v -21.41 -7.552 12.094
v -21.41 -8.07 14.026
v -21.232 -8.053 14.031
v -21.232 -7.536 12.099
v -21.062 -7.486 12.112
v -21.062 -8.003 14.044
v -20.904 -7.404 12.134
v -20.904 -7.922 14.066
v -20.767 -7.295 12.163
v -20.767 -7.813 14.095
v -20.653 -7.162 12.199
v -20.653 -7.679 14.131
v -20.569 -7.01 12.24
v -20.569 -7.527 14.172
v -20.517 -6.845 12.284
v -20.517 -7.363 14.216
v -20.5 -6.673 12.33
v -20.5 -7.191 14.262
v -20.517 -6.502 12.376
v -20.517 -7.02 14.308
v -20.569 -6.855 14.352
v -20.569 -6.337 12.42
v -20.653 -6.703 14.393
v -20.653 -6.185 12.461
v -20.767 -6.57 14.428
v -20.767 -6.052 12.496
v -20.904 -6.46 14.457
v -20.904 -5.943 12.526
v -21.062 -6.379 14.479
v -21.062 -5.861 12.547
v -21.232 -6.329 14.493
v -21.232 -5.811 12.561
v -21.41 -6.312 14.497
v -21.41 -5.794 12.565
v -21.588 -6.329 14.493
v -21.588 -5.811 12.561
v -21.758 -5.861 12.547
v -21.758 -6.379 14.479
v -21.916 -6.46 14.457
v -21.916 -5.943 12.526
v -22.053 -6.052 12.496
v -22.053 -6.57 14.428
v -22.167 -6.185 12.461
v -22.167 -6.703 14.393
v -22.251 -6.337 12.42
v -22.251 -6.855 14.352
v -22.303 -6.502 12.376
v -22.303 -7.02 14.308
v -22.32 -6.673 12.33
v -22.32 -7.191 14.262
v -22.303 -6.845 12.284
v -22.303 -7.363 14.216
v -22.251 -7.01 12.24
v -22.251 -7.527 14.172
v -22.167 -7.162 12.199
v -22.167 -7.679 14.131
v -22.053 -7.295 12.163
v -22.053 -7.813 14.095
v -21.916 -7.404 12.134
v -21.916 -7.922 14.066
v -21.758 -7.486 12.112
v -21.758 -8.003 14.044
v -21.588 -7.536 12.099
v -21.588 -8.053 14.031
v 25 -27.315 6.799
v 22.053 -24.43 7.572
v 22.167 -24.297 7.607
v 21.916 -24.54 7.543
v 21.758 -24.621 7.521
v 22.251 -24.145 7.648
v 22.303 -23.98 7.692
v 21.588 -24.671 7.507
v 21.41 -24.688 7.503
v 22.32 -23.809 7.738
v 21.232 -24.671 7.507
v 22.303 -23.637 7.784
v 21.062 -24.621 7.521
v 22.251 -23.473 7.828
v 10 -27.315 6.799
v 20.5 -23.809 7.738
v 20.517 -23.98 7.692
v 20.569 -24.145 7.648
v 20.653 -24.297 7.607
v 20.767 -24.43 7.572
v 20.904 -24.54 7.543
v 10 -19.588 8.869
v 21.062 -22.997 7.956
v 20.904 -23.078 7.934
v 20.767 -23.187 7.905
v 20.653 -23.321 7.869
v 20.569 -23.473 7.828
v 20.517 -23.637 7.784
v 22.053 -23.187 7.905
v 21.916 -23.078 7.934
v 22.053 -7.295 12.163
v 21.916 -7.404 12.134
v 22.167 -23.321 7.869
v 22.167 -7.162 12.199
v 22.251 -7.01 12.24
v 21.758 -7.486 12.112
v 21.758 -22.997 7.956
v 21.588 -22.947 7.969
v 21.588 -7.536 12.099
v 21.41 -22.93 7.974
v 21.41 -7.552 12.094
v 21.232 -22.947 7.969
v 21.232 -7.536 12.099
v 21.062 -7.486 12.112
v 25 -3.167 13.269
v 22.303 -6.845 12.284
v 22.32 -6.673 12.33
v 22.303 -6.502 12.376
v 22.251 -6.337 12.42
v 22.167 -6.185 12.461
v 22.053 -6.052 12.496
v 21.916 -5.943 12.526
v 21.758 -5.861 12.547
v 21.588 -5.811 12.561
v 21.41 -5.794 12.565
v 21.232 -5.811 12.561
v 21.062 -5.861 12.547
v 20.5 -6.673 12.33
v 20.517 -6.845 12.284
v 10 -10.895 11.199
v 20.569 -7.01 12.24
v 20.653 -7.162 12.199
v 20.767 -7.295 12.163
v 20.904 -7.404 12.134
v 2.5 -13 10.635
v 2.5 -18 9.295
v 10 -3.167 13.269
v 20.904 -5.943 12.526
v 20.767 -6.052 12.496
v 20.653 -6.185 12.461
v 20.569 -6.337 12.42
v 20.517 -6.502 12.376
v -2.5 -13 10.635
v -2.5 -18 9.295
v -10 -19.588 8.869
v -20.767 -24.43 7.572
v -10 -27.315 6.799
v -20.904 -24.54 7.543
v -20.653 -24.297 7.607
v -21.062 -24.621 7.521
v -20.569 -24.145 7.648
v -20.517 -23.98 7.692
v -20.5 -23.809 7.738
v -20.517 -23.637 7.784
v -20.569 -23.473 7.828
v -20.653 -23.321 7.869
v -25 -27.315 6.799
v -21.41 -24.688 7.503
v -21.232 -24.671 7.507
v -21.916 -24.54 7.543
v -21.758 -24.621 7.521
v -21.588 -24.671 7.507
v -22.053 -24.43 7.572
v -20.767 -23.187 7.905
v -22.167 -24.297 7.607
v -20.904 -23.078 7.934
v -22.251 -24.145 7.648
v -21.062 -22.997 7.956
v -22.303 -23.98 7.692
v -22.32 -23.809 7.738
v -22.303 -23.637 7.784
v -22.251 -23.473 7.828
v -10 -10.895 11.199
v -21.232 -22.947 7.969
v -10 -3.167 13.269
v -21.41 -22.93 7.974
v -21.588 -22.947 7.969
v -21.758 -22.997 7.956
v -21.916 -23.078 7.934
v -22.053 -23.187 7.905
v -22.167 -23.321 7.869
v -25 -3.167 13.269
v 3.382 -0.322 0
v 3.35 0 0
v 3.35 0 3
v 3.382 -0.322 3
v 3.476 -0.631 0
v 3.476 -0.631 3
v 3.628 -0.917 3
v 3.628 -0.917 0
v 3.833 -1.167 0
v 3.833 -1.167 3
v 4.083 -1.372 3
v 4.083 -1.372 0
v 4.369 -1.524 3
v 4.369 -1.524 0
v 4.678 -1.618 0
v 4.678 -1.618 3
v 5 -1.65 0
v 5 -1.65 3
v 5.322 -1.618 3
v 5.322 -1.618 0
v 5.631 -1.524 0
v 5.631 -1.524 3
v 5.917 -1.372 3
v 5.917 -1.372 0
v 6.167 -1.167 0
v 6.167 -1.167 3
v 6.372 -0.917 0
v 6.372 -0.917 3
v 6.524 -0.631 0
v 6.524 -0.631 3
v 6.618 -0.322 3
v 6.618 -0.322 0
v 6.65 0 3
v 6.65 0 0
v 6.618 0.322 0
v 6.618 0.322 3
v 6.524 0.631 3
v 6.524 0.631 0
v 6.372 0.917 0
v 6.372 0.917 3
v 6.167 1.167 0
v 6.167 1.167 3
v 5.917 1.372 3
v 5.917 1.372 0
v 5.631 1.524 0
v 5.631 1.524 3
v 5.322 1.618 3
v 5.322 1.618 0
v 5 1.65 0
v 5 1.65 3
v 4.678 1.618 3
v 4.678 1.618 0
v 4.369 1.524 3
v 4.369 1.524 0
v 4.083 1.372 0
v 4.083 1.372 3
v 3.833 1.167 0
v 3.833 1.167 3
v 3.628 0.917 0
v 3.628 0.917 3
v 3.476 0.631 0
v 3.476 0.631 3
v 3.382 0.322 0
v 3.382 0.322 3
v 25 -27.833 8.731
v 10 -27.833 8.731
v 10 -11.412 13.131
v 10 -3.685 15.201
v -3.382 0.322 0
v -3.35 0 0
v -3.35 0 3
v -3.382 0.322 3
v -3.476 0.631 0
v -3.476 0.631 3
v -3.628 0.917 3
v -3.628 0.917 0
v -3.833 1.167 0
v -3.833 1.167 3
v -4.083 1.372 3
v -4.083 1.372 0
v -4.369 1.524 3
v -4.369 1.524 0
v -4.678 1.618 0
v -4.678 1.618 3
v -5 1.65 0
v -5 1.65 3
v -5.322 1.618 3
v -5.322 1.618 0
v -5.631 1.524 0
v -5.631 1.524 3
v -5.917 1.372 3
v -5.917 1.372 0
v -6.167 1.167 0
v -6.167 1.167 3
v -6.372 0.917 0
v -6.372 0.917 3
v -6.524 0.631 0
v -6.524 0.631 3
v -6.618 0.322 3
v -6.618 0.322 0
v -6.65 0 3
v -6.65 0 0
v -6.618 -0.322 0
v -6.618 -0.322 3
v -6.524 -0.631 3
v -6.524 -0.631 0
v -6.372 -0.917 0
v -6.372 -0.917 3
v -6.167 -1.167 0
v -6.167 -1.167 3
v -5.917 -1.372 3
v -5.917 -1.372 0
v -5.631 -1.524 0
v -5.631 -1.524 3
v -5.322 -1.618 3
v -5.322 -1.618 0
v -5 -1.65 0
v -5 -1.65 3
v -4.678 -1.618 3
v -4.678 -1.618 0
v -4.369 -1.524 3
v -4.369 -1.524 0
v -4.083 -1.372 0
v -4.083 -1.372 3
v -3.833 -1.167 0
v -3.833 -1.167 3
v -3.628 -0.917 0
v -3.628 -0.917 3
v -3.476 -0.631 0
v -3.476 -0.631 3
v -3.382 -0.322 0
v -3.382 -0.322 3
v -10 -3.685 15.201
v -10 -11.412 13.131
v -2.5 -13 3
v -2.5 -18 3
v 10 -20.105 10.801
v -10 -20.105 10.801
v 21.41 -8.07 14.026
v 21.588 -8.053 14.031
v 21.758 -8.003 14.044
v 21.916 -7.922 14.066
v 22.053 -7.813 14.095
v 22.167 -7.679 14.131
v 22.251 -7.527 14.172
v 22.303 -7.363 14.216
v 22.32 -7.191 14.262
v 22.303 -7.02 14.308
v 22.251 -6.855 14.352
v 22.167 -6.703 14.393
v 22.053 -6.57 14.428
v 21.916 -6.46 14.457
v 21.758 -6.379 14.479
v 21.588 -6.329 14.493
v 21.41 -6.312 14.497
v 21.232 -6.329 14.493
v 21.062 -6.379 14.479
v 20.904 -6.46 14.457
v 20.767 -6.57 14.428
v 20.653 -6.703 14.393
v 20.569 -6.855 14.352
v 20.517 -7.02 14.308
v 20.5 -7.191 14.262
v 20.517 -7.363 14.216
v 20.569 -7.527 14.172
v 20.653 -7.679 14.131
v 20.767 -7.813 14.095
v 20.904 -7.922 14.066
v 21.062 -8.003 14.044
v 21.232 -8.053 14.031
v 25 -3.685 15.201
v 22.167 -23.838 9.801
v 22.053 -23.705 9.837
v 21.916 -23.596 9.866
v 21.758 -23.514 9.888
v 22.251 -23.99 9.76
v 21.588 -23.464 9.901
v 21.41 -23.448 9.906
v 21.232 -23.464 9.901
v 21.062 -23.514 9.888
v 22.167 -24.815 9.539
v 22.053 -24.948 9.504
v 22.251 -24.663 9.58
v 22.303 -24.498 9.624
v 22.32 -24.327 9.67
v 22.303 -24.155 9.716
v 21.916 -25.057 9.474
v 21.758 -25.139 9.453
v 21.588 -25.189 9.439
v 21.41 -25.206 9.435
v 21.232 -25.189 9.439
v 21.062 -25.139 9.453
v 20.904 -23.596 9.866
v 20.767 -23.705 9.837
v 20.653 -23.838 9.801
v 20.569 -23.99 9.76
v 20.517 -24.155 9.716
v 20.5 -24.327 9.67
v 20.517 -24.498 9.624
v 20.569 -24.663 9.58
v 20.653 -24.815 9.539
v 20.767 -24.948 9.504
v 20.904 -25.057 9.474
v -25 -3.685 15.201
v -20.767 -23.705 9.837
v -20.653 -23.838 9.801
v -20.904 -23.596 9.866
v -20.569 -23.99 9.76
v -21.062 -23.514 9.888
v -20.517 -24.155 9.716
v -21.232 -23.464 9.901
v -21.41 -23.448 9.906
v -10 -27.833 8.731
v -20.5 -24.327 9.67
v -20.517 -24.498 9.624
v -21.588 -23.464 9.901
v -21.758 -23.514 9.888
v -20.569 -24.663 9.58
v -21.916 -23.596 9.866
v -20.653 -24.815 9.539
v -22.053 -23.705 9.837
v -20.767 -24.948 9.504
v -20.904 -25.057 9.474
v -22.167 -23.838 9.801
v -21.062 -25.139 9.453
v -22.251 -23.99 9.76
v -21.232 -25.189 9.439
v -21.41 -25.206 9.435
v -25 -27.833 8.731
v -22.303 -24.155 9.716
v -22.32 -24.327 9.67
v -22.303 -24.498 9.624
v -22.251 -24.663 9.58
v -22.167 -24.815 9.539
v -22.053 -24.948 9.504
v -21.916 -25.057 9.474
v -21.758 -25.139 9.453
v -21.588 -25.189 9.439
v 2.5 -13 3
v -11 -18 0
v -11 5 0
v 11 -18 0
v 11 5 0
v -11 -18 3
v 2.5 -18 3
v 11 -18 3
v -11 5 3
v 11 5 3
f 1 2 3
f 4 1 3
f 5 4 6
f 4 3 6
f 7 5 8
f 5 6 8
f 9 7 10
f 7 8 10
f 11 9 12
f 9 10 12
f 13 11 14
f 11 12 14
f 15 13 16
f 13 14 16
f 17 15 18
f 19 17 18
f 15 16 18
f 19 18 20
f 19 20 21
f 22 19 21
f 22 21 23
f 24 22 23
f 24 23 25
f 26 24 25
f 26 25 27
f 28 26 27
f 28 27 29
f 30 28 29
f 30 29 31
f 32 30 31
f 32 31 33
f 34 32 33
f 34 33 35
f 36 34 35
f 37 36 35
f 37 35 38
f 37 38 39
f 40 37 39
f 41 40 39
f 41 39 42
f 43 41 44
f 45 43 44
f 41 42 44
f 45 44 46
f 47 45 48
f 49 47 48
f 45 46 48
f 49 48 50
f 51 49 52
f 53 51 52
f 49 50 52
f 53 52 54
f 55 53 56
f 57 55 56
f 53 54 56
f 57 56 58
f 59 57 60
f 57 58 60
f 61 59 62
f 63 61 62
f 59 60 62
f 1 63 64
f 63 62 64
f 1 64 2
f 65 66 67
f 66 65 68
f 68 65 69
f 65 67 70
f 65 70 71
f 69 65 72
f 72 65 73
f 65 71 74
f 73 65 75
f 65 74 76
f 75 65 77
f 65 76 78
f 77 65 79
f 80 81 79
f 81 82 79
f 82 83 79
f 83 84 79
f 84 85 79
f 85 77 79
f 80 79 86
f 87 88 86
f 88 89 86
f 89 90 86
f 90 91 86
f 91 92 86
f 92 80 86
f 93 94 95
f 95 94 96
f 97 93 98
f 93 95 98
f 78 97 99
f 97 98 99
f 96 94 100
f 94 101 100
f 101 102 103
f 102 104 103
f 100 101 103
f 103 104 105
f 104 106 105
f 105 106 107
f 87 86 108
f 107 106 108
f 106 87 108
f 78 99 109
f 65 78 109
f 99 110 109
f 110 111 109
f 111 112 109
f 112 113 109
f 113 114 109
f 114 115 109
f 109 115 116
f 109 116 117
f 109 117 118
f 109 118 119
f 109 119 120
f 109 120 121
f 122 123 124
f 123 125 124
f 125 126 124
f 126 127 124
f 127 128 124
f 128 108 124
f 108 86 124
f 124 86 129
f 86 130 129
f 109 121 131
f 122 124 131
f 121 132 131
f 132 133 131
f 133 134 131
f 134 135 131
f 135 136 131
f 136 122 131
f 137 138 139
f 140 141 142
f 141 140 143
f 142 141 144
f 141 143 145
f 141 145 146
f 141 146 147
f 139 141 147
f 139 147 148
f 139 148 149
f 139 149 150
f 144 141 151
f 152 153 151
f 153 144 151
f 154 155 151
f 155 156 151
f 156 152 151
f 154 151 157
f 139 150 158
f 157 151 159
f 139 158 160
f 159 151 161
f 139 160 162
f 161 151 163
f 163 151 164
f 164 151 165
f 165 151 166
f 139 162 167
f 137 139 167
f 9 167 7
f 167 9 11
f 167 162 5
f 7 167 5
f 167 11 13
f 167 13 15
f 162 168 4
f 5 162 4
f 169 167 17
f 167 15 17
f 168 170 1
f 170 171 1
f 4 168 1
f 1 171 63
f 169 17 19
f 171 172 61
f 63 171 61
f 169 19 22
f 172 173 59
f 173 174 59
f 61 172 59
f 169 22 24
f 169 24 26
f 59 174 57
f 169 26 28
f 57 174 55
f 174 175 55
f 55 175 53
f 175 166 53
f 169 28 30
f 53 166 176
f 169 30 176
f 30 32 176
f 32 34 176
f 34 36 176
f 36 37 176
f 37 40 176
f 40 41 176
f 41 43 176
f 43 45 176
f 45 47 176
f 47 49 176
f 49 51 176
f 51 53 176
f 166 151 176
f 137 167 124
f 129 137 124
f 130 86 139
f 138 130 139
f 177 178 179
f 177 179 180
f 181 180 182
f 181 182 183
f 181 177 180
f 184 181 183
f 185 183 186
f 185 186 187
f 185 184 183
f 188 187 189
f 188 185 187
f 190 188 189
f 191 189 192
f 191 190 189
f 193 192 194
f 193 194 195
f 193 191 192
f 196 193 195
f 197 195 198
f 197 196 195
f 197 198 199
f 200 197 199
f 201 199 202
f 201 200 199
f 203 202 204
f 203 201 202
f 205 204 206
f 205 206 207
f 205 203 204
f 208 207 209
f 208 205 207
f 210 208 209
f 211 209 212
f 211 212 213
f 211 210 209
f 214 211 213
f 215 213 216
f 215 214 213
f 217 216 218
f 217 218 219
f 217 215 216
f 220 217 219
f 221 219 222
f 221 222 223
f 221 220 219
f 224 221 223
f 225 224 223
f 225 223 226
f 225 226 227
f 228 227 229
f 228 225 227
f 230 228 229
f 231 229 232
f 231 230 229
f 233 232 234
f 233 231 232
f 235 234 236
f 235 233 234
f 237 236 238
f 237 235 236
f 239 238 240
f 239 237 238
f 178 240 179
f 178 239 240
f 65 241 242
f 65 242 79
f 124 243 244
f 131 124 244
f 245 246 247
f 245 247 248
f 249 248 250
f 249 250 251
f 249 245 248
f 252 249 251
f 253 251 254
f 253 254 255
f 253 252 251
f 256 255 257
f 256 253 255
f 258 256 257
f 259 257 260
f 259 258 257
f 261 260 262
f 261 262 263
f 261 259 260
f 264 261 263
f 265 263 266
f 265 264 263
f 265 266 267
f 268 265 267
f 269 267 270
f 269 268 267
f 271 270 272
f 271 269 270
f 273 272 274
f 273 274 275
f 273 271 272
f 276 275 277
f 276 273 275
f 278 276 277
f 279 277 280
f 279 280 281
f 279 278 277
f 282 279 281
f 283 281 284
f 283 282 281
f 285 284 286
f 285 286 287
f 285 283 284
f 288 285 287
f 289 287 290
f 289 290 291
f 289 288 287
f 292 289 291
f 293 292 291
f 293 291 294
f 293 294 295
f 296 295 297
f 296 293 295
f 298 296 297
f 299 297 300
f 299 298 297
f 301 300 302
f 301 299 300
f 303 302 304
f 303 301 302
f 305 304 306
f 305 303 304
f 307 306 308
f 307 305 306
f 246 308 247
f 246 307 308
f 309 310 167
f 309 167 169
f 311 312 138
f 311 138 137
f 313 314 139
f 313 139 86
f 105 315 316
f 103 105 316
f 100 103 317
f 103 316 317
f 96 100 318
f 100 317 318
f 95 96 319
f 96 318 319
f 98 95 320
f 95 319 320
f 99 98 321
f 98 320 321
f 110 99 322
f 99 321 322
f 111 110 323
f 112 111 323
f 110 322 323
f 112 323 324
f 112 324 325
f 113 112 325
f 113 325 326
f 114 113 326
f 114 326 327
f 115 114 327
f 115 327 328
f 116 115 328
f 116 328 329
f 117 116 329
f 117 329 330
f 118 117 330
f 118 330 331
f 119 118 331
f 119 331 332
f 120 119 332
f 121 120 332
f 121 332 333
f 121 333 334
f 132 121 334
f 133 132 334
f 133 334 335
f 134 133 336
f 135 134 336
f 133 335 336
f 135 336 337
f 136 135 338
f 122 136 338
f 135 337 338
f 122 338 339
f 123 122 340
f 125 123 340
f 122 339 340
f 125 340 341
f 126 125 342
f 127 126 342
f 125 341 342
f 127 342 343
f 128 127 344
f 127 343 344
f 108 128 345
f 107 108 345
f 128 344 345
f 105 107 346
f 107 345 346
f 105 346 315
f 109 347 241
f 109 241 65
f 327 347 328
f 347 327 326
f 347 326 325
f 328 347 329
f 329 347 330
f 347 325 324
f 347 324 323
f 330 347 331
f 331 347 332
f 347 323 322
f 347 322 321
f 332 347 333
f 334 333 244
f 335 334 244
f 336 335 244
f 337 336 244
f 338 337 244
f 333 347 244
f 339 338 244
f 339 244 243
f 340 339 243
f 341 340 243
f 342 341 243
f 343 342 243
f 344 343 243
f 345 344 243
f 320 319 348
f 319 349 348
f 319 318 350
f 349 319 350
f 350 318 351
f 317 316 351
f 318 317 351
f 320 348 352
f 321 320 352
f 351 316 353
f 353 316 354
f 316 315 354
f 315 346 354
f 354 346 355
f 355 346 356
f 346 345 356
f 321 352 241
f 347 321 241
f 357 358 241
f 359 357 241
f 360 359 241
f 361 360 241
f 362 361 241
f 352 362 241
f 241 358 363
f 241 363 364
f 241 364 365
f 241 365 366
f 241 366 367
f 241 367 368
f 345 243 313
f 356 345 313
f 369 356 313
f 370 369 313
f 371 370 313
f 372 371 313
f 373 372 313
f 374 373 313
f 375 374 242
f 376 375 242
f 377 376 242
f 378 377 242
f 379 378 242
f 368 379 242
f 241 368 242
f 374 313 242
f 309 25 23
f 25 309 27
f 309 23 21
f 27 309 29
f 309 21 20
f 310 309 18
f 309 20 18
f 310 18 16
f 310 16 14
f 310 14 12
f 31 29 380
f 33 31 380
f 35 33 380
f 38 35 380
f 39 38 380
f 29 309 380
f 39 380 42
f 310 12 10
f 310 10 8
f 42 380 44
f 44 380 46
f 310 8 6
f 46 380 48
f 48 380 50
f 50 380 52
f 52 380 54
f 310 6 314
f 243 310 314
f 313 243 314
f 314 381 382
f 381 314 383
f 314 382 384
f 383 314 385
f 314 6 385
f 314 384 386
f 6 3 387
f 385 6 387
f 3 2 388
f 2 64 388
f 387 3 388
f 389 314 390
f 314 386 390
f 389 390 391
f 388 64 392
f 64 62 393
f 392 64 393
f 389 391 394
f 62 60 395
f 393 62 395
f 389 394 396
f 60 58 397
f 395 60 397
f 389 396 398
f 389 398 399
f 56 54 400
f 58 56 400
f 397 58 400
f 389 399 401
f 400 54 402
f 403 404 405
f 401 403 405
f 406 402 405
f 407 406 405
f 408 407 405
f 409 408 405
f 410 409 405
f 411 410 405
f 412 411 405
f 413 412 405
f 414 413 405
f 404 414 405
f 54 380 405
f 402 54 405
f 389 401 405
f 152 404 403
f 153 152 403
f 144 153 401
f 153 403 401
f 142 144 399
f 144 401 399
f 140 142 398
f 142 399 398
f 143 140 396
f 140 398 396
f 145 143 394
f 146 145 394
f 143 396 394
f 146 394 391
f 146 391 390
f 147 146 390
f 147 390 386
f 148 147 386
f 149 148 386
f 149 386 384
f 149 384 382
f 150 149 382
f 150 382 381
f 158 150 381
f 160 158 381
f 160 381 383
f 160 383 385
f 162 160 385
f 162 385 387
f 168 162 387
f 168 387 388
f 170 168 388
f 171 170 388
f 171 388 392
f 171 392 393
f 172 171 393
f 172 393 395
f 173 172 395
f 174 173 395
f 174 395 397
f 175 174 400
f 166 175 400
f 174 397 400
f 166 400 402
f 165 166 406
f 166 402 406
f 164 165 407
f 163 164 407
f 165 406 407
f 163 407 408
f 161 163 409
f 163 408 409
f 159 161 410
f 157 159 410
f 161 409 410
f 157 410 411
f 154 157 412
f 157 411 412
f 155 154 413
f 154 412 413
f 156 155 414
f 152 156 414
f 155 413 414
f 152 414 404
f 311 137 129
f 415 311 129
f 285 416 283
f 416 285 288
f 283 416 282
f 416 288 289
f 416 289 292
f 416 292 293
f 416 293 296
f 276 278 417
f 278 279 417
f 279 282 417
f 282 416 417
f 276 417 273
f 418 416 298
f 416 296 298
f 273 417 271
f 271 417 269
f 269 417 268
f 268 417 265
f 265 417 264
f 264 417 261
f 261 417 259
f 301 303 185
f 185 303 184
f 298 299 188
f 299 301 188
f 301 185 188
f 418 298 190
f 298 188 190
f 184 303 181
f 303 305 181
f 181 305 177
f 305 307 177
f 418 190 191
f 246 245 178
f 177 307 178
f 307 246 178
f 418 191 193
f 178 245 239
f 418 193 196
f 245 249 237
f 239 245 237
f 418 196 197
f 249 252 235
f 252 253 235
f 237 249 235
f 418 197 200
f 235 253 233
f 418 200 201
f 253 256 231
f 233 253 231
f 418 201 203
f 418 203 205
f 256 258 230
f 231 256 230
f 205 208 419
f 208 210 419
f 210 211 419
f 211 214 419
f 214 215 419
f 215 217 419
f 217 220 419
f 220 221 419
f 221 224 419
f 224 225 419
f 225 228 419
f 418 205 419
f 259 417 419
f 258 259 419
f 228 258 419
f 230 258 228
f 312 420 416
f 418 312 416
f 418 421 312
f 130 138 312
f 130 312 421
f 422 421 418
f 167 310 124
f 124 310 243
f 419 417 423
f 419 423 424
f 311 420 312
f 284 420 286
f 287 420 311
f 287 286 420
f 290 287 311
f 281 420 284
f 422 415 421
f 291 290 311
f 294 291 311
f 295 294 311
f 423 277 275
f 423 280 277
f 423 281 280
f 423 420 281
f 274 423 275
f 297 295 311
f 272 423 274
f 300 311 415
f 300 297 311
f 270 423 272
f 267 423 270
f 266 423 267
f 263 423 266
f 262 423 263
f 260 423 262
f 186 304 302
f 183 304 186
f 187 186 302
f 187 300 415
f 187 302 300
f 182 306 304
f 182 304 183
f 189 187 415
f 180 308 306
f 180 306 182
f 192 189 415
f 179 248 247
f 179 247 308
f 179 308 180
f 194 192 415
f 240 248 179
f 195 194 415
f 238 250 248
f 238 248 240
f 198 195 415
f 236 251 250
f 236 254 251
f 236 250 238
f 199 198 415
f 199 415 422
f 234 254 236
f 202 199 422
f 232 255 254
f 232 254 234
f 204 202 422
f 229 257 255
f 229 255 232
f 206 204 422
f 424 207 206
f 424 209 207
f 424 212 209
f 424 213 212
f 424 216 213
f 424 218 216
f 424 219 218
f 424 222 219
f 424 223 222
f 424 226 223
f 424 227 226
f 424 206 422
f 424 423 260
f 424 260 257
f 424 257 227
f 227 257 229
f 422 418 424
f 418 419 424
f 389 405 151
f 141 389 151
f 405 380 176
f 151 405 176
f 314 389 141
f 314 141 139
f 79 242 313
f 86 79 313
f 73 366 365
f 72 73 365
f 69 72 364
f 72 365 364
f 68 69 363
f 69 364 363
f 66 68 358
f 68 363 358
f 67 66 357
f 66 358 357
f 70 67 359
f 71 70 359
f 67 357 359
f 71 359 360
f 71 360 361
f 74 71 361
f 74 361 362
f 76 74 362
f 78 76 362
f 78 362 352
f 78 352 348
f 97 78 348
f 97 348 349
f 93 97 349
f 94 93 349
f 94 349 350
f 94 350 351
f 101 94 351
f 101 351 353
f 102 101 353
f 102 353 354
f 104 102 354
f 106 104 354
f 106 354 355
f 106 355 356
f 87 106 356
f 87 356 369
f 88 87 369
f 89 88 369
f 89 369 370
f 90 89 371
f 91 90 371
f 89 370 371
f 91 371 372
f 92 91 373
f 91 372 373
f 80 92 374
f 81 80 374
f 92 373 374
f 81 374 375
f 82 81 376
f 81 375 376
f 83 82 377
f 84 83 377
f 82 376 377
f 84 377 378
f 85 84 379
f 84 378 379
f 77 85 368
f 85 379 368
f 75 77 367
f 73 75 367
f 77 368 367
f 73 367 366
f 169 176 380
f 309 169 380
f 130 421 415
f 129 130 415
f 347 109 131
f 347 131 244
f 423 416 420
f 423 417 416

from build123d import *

# Parameters (mm, degrees)
SKETCH_1_W          = 22
SKETCH_1_H          = 10
SKETCH_1_R          = 1.65
EXTRUDE_1_DEPTH     = 3
SKETCH_2_W          = 22
SKETCH_2_H          = 3
EXTRUDE_2_DEPTH     = 13
SKETCH_4_W          = 5
SKETCH_4_H          = 5
EXTRUDE_3_DEPTH     = 8
EXTRUDE_4_DEPTH     = 25
SKETCH_7_R          = 0.91
CUT_EXTRUDE_1_DEPTH = 30
SKETCH_8_W          = 20
SKETCH_8_H          = 8
CUT_EXTRUDE_2_DEPTH = 5


with BuildPart() as part:
    # 草图1 → 凸台-拉伸1 (new body)
    with BuildSketch(Plane.XY):
        Rectangle(SKETCH_1_W, SKETCH_1_H)
        with Locations((-5, 0)):
            Circle(SKETCH_1_R, mode=Mode.SUBTRACT)
        with Locations(Location((5, 0, 0), (0, 0, 180))):
            Circle(SKETCH_1_R, mode=Mode.SUBTRACT)
    extrude(amount=EXTRUDE_1_DEPTH)

    # 草图2 → 凸台-拉伸2 (add)
    with BuildSketch(Plane.XZ.offset(5)):
        with Locations((0, 1.5)):
            Rectangle(SKETCH_2_W, SKETCH_2_H)
    extrude(amount=EXTRUDE_2_DEPTH)

    # 草图4 → 凸台-拉伸3 (add)
    with BuildSketch(Plane.XY.offset(3)):
        with Locations((0, -15.5)):
            Rectangle(SKETCH_4_W, SKETCH_4_H)
    extrude(amount=EXTRUDE_3_DEPTH)

    # 草图6 → 凸台-拉伸4 (add, symmetric)
    with BuildSketch(Plane.ZY):
        Polygon((6.79883611, -27.315253784), (13.269312237, -3.167108126), (15.20116389, -3.684746216), (8.730687763, -27.832891874), align=None)
    extrude(amount=EXTRUDE_4_DEPTH, both=True)

    # 草图7 → 切除-拉伸1 (cut)
    with BuildSketch(Plane(origin=(0, -4.047122166, 15.104065547), x_dir=(1, 0, 0), z_dir=(0, -0.25881904510251497, 0.9659258262890699))):
        with Locations(Location((-21.41, -3.254840811, 0), (0, 0, 270))):
            Circle(SKETCH_7_R)
        with Locations(Location((21.41, -3.254840811, 0), (0, 0, 270))):
            Circle(SKETCH_7_R)
        with Locations(Location((21.41, -20.994840811, 0), (0, 0, 270))):
            Circle(SKETCH_7_R)
        with Locations(Location((-21.41, -20.994840811, 0), (0, 0, 270))):
            Circle(SKETCH_7_R)
    extrude(amount=-CUT_EXTRUDE_1_DEPTH, mode=Mode.SUBTRACT)

    # 草图8 → 切除-拉伸2 (cut)
    with BuildSketch(Plane(origin=(0, -4.047122166, 15.104065547), x_dir=(1, 0, 0), z_dir=(0, -0.25881904510251497, 0.9659258262890699))):
        with Locations((0, -3.624840811)):
            Rectangle(SKETCH_8_W, SKETCH_8_H)
        with Locations((0, -20.624840811)):
            Rectangle(SKETCH_8_W, SKETCH_8_H)
    extrude(amount=-CUT_EXTRUDE_2_DEPTH, mode=Mode.SUBTRACT)


solid = part.part
